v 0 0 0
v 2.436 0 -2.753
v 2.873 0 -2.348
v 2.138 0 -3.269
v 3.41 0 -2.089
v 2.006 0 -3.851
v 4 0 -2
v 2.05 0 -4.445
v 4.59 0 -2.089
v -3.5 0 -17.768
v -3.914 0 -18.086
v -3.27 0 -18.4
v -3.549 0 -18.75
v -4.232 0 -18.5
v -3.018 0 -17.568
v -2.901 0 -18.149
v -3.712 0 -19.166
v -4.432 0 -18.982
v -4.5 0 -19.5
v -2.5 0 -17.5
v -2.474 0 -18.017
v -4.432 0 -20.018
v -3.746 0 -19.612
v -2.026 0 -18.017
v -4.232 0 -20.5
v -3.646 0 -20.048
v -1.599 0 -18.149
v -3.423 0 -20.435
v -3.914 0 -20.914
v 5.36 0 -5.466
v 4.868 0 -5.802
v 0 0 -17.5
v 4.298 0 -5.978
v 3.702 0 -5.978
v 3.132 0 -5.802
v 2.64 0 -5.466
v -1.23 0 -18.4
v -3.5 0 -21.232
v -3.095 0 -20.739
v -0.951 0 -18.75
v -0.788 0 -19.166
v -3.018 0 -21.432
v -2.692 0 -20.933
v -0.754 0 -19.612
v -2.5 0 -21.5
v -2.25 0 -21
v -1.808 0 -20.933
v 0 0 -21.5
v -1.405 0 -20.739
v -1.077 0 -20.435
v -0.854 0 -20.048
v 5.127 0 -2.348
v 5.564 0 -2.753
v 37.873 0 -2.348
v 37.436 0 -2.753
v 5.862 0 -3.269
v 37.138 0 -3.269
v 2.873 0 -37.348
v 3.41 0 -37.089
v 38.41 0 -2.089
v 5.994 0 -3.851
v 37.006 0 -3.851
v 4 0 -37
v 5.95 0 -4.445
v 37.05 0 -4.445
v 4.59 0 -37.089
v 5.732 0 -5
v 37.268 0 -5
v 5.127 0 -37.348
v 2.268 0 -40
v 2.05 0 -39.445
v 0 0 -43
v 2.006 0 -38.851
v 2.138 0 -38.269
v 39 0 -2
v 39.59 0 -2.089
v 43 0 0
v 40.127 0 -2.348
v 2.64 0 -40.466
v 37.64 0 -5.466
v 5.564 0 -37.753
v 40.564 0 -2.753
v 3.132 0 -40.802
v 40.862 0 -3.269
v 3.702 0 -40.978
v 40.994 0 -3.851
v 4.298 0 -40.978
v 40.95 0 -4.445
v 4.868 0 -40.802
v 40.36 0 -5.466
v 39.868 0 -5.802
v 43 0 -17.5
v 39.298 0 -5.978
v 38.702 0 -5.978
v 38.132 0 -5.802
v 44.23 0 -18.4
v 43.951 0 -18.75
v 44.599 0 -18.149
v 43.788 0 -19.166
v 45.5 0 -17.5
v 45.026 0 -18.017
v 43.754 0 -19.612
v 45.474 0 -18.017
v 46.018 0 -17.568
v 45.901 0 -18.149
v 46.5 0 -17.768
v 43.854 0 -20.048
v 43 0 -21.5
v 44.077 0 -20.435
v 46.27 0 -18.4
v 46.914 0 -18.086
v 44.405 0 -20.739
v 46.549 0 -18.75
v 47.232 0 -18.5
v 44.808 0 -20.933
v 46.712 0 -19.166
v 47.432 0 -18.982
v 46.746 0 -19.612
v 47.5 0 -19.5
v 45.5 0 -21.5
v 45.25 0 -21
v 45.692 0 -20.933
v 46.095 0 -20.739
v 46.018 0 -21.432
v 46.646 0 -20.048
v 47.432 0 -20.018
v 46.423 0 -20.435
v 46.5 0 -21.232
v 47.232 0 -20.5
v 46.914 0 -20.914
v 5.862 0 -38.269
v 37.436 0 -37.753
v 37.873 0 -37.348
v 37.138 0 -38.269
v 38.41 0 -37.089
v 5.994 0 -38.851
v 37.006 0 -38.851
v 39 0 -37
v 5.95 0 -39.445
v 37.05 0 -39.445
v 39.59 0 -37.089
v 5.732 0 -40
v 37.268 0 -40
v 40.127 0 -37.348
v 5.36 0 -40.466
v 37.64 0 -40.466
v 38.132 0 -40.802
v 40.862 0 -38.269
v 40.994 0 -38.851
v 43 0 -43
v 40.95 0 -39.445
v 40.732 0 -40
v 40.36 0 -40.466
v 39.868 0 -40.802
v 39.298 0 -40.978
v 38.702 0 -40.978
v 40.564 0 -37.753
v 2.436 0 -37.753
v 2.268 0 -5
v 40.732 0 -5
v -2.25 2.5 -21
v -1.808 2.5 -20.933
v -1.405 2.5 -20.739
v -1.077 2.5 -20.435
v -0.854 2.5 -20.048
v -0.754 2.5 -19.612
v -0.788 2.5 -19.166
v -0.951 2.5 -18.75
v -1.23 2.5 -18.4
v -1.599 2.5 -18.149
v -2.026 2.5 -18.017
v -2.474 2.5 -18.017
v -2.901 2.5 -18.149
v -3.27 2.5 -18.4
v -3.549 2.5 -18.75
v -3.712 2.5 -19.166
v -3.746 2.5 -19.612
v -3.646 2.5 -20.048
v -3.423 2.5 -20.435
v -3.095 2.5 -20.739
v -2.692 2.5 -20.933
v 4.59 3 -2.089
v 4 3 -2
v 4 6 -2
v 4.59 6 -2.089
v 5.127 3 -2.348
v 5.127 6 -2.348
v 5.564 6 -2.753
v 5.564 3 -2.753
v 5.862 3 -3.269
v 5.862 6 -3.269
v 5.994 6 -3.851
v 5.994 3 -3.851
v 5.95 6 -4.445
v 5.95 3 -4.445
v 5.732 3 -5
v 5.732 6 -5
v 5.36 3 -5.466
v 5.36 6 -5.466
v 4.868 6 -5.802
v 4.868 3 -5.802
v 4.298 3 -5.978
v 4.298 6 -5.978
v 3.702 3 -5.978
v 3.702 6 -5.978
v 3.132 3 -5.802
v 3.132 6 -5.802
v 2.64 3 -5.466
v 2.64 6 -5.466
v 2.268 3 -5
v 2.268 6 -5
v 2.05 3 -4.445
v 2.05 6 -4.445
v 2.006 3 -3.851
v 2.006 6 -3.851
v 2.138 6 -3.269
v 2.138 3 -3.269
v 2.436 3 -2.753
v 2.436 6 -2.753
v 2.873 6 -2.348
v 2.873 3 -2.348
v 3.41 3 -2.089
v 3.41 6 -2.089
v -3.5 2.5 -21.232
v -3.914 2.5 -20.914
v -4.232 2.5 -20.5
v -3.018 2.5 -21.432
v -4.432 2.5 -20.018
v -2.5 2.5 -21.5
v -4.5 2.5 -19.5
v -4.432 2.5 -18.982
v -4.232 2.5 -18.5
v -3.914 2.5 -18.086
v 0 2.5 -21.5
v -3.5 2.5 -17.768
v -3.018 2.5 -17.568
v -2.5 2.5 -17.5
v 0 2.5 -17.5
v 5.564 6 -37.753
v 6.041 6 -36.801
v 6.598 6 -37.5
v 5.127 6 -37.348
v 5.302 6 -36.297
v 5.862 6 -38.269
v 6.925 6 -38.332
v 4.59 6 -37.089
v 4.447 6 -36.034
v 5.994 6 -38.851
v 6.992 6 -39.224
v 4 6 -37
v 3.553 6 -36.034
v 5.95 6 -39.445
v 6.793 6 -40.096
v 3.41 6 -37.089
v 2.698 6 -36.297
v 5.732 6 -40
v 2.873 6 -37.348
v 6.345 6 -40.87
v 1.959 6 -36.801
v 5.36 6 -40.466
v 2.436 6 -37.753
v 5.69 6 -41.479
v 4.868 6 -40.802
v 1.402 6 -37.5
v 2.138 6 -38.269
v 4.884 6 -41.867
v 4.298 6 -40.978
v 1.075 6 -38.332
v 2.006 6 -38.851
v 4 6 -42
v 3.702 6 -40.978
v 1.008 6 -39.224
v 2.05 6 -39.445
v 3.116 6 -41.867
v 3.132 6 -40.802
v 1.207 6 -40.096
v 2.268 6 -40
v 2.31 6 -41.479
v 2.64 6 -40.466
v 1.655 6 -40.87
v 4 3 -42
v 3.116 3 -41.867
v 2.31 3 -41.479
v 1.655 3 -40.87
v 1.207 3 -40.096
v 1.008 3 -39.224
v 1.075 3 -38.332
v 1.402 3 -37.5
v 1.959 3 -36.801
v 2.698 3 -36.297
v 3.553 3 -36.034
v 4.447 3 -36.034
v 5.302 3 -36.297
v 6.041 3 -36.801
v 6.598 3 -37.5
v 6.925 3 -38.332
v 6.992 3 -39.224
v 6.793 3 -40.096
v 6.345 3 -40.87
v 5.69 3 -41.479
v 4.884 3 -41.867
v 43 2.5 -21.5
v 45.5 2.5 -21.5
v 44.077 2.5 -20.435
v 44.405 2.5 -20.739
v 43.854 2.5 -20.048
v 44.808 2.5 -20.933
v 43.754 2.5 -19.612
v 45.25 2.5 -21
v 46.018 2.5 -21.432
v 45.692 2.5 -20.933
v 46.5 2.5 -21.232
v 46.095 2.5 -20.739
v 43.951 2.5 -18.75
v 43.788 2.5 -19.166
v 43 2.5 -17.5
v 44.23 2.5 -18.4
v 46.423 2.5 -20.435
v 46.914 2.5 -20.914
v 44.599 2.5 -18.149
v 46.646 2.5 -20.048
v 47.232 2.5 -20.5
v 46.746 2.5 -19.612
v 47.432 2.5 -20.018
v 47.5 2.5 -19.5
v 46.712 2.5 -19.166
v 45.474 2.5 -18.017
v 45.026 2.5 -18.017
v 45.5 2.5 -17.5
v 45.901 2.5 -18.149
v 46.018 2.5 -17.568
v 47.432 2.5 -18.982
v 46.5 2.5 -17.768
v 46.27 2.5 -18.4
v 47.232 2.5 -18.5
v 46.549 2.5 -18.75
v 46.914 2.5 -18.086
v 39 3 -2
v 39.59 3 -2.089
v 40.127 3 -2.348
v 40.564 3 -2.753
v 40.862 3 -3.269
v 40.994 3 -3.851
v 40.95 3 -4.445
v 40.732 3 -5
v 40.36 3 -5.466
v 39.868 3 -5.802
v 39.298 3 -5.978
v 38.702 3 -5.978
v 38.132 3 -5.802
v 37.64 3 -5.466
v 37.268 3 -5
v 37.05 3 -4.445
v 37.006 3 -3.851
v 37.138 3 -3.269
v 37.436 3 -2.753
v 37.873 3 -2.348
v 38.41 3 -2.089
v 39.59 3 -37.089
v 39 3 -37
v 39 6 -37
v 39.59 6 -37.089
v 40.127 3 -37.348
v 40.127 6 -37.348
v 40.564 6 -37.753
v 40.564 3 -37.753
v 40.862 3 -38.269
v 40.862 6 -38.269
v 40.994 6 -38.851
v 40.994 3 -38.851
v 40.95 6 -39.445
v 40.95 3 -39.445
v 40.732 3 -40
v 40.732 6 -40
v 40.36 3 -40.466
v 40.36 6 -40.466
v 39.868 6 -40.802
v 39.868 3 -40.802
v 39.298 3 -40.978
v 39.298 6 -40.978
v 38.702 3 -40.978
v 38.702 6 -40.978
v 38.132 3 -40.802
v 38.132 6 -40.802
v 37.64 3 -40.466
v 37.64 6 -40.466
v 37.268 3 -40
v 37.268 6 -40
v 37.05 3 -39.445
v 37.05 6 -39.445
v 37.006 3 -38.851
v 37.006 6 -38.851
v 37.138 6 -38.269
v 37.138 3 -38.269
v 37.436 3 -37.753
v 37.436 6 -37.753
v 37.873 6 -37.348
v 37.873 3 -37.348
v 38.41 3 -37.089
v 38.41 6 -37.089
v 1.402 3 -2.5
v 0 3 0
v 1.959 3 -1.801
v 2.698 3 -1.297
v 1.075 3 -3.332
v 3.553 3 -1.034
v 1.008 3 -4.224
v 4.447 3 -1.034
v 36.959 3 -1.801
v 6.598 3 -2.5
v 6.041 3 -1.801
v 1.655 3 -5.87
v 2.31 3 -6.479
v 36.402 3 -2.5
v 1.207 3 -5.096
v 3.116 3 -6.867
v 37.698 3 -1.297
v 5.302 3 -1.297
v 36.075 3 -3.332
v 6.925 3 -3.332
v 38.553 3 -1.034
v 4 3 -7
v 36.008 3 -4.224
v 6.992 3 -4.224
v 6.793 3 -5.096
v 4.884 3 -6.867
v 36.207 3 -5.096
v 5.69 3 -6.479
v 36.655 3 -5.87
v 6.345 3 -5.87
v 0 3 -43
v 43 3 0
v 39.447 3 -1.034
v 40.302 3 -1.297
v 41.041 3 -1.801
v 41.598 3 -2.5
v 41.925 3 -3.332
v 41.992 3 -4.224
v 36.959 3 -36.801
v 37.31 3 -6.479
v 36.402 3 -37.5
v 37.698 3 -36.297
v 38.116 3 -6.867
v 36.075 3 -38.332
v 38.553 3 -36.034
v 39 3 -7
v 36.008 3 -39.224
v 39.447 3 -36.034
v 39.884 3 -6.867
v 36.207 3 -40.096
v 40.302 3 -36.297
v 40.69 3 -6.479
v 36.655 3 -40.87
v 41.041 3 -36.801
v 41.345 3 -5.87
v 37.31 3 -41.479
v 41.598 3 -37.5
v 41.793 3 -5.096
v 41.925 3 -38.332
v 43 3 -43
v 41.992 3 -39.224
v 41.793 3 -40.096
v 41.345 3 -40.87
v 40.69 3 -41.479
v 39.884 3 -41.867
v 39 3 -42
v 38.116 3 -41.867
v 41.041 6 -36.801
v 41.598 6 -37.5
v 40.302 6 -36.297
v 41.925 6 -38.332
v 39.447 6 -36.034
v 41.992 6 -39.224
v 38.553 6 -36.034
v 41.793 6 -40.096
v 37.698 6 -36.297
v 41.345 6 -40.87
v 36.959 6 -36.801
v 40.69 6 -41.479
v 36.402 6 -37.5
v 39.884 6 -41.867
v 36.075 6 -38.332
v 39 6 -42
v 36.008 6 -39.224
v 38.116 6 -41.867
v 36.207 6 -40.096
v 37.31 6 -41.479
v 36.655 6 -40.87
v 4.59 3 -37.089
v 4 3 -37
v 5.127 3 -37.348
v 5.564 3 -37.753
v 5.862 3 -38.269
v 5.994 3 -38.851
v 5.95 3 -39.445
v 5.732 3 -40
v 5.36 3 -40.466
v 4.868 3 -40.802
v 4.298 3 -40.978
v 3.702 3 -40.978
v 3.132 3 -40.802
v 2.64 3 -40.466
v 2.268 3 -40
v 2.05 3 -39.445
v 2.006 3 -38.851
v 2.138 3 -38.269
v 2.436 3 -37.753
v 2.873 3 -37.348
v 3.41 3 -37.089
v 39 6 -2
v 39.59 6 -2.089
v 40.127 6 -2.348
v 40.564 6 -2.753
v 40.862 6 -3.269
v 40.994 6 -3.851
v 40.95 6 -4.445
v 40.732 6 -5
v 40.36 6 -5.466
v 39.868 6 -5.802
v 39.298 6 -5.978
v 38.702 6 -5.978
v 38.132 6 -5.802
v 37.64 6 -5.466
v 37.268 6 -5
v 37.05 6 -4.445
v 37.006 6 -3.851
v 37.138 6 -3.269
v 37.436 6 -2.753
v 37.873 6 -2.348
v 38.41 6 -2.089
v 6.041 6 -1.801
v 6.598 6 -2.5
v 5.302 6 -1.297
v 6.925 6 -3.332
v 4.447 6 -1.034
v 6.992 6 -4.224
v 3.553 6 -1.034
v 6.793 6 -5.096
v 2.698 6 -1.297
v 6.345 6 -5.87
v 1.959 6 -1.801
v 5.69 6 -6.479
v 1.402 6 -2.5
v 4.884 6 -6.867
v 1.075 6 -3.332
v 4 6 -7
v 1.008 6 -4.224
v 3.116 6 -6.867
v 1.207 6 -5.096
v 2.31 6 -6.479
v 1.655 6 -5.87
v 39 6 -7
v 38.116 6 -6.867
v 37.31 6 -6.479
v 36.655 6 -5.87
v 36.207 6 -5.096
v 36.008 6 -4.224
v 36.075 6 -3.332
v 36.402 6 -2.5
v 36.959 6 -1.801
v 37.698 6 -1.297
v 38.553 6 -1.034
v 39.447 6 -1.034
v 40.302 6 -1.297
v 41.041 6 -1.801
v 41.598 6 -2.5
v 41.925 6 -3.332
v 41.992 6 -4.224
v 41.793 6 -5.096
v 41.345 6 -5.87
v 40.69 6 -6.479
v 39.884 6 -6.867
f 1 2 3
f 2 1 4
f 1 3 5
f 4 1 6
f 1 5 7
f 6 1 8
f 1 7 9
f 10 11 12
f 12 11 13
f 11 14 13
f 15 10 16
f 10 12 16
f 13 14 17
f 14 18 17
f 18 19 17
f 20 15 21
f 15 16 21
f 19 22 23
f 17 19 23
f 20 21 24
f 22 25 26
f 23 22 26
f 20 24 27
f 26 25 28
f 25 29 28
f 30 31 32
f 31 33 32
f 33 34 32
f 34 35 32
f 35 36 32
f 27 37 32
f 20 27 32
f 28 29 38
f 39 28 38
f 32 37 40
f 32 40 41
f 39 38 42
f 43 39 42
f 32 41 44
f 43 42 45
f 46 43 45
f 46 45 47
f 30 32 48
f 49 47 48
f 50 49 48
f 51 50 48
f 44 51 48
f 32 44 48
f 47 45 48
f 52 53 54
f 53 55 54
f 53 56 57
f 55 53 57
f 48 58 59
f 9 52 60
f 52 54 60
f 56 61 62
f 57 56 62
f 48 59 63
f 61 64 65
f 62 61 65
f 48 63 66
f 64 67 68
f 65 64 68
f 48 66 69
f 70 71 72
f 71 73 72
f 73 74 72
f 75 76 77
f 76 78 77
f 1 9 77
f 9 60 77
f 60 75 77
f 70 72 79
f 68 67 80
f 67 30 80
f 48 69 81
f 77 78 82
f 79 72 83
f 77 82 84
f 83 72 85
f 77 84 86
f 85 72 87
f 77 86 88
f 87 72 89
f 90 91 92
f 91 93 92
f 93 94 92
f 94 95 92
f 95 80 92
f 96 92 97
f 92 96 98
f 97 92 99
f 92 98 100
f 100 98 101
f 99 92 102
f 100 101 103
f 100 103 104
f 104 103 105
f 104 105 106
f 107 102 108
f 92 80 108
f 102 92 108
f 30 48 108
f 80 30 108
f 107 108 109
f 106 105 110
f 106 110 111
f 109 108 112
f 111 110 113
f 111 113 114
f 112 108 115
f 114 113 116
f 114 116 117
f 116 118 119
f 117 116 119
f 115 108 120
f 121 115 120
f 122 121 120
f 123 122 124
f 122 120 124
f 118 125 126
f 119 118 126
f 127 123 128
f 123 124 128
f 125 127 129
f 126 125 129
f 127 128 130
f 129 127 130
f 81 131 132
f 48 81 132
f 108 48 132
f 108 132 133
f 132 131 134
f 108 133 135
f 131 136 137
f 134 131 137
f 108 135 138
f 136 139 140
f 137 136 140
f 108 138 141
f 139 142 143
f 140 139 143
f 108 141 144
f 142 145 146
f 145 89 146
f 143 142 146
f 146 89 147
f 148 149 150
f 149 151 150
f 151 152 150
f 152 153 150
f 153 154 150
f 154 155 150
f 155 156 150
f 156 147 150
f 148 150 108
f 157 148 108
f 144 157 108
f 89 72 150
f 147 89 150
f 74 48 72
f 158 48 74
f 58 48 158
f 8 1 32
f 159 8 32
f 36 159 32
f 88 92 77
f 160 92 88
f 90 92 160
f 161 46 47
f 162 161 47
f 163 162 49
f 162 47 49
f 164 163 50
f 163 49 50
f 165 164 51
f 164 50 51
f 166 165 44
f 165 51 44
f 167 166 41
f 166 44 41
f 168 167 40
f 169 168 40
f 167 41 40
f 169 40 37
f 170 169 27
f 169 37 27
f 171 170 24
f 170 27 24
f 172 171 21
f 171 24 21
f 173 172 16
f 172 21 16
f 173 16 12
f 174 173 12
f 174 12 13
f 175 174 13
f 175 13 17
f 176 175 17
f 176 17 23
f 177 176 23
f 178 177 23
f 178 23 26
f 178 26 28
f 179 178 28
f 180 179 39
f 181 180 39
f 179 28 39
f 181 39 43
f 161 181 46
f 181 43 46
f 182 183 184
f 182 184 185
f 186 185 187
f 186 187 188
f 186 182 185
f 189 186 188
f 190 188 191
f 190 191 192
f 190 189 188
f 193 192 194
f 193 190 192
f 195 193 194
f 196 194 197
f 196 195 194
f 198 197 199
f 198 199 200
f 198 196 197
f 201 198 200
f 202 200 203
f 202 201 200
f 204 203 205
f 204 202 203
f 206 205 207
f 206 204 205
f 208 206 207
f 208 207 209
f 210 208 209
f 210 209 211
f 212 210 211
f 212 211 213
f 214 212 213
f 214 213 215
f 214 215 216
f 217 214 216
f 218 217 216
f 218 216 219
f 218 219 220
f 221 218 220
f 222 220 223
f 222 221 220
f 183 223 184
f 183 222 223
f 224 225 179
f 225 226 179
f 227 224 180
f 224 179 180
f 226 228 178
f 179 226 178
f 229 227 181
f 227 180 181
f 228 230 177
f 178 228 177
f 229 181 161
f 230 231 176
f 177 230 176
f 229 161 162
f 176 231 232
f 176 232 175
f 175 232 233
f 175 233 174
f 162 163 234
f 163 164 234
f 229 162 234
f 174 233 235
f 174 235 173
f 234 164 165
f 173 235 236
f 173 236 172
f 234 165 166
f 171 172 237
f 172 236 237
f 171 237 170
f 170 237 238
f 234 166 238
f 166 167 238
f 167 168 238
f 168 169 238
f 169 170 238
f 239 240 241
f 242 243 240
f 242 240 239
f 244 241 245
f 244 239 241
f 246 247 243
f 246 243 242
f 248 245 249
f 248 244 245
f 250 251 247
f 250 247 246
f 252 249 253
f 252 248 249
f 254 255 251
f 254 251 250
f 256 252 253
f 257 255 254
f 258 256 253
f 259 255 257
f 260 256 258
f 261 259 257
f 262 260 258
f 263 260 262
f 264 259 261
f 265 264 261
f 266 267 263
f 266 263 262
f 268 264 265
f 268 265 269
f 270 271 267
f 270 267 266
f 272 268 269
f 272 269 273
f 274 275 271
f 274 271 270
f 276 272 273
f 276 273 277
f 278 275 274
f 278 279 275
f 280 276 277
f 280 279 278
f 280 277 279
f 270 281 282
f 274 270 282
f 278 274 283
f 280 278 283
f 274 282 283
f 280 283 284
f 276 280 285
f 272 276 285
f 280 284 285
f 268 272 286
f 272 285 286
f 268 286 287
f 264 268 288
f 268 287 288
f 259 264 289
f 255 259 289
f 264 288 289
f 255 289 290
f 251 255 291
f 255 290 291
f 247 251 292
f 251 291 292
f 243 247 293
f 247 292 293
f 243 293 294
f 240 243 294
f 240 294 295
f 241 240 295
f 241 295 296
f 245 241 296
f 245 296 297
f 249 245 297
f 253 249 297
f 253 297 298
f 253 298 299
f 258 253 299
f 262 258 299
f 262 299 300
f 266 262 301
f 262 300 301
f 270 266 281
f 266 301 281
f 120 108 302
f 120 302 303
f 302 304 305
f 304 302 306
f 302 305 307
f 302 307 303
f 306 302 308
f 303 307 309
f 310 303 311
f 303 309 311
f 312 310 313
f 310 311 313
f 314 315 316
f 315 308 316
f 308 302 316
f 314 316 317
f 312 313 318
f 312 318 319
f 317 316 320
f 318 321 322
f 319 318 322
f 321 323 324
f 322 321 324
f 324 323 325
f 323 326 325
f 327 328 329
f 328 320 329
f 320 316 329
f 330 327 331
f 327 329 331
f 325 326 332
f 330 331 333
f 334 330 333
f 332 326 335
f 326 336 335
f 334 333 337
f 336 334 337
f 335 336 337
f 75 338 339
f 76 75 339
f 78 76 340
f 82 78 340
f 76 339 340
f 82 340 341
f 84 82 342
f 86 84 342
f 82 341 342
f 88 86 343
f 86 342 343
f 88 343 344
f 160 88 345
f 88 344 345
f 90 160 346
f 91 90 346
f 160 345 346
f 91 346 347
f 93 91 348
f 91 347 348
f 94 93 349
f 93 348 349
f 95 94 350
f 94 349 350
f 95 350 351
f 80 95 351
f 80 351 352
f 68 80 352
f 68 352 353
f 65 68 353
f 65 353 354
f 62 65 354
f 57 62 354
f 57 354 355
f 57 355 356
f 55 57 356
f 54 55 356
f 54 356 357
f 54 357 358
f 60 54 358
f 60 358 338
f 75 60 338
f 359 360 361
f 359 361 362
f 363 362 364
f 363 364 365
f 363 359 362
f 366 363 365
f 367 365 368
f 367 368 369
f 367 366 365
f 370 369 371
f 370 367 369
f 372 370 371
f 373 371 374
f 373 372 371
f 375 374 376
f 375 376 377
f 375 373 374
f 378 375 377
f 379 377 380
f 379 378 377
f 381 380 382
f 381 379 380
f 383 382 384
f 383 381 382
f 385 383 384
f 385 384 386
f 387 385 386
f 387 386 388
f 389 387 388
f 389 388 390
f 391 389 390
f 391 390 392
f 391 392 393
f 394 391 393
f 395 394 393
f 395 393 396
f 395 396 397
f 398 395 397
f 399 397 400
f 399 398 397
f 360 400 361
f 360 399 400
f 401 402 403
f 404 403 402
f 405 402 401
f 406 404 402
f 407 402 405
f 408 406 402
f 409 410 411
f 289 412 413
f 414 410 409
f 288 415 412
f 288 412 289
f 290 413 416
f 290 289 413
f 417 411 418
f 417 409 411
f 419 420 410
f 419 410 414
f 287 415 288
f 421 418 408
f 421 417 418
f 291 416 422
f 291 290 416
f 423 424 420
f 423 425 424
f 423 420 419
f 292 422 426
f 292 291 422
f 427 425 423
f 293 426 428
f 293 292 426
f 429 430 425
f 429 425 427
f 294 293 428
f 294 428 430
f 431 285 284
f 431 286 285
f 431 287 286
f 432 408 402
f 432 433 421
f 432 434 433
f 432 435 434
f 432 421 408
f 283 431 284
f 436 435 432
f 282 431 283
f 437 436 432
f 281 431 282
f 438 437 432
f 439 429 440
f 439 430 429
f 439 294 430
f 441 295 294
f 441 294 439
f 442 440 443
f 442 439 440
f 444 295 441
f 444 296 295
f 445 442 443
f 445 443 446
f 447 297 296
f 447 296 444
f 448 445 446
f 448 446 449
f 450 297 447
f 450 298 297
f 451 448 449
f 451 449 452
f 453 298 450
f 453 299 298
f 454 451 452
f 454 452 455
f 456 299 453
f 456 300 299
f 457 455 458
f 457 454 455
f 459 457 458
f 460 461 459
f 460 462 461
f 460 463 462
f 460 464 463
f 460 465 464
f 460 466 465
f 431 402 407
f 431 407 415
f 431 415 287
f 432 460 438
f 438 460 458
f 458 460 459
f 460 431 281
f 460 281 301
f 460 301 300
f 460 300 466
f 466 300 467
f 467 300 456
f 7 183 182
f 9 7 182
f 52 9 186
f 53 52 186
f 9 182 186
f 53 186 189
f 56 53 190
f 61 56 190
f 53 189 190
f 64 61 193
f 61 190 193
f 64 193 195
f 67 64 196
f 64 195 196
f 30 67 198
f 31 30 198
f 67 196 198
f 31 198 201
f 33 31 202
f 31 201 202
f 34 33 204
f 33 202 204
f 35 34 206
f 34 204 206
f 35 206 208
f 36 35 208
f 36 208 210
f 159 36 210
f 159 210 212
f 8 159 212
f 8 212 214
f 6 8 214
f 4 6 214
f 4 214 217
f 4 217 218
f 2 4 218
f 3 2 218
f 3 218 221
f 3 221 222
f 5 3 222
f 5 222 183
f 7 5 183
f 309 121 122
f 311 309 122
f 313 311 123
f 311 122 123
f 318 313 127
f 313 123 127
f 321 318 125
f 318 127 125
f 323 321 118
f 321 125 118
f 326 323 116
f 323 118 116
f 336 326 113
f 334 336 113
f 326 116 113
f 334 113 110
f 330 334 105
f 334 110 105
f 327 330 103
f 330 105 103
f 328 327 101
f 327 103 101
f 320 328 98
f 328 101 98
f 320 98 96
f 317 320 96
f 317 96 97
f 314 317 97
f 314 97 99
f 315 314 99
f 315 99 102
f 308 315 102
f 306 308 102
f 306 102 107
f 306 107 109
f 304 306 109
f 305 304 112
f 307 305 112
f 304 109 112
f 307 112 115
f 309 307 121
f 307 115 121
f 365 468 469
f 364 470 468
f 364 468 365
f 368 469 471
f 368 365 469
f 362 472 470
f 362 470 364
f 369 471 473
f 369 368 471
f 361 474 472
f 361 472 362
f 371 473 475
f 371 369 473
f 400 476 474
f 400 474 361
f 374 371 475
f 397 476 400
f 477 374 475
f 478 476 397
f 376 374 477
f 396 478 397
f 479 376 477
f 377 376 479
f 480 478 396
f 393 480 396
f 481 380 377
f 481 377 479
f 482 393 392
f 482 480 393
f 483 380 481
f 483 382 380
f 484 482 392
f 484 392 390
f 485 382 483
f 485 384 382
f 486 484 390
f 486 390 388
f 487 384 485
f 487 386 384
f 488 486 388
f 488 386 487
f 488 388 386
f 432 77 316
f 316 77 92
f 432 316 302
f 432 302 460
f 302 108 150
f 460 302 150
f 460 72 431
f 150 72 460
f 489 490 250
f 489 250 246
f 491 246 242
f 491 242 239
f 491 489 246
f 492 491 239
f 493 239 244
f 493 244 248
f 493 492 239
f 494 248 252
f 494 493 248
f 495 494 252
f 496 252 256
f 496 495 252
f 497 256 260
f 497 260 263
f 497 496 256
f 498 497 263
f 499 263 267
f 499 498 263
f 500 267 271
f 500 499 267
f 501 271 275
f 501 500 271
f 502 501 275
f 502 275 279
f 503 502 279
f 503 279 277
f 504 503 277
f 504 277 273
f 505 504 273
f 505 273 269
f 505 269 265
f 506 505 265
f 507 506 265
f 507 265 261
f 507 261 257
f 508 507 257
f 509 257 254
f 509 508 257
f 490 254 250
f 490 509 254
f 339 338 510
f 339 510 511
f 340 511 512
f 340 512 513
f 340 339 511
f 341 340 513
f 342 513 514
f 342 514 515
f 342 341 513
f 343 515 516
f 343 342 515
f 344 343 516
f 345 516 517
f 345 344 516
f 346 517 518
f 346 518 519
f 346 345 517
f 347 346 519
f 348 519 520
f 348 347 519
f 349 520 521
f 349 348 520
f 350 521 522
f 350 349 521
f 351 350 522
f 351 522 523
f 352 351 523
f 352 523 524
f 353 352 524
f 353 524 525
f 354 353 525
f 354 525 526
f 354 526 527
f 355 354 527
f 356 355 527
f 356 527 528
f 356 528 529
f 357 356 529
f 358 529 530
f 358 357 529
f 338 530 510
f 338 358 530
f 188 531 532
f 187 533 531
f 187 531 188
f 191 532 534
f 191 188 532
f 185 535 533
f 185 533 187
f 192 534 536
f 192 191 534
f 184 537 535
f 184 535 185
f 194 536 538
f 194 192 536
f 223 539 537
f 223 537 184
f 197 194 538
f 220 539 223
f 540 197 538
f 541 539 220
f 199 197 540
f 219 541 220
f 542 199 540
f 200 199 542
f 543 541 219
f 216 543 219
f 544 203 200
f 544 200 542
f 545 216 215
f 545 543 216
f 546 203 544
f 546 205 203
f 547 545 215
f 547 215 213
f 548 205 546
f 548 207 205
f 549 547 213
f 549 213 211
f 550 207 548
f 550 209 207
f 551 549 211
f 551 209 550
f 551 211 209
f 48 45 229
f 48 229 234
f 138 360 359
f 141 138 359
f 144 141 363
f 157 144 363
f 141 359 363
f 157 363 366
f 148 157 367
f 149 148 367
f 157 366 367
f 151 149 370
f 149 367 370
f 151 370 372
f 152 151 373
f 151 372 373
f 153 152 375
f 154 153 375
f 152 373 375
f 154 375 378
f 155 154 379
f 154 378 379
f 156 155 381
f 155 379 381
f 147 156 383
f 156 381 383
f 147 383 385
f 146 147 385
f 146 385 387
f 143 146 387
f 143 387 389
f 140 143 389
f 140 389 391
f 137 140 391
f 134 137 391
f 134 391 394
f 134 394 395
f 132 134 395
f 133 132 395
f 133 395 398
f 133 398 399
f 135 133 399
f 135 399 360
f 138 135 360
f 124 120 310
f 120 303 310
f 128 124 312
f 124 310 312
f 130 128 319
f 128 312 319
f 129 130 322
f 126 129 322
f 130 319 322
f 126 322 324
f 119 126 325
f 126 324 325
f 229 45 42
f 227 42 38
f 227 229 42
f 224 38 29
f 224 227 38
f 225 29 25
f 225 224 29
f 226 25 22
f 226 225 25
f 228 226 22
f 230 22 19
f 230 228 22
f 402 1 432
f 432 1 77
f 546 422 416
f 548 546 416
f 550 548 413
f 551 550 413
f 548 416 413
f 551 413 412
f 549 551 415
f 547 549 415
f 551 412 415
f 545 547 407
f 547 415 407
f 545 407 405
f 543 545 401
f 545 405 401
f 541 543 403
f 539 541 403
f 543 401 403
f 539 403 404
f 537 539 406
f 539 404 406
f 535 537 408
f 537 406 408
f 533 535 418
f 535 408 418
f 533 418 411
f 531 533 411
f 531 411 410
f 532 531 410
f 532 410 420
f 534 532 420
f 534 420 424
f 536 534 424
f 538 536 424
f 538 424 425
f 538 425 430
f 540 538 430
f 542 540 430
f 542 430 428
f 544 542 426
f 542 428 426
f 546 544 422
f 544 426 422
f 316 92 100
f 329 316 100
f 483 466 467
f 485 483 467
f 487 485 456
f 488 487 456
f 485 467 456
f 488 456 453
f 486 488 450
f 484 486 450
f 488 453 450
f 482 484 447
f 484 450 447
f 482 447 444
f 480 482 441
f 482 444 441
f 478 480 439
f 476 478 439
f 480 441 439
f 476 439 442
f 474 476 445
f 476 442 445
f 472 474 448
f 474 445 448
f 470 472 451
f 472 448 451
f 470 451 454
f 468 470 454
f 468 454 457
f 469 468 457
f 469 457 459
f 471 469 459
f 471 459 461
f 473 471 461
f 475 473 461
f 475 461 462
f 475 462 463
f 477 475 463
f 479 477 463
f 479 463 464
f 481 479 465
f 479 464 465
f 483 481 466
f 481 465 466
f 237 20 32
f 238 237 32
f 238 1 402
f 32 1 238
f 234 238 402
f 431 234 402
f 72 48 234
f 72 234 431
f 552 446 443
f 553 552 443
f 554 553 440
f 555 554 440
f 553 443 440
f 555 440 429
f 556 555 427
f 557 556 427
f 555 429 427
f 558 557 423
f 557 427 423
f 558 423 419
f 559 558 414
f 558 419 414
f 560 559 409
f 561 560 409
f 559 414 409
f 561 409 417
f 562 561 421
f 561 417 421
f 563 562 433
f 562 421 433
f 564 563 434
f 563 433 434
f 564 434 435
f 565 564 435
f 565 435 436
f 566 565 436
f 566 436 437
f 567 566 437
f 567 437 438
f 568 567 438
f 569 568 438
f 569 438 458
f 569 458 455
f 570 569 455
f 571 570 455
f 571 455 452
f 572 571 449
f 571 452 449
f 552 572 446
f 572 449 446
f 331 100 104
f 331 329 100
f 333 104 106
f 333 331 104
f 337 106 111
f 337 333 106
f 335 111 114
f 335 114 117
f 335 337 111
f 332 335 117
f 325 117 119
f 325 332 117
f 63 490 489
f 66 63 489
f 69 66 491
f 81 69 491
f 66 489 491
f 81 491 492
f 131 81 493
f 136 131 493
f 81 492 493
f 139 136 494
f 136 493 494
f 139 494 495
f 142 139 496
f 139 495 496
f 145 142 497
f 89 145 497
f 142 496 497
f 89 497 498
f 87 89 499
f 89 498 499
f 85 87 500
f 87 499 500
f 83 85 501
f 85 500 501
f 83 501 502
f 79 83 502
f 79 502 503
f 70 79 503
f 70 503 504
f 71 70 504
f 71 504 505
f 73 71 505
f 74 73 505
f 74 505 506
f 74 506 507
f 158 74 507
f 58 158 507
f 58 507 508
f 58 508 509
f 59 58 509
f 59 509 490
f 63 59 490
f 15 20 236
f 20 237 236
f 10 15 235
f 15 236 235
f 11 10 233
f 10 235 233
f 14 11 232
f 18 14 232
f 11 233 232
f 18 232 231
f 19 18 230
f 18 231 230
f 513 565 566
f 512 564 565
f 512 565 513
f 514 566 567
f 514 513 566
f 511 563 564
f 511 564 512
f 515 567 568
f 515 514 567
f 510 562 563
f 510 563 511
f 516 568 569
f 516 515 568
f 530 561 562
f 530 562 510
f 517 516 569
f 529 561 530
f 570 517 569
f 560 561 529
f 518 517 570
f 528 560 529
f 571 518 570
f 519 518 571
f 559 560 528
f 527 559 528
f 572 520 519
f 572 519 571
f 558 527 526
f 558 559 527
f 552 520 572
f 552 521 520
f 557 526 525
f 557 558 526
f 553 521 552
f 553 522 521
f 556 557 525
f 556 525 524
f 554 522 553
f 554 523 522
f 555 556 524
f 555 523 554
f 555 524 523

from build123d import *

# Parameters (mm, degrees)
SKETCH1_W            = 43
SKETCH1_H            = 43
BOSS_EXTRUDE1_DEPTH  = 3
SKETCH2_R            = 3
SKETCH2_R_2          = 2
BOSS_EXTRUDE5_DEPTH  = 3
SKETCH2_9_R          = 3
SKETCH2_9_R_2        = 2
BOSS_EXTRUDE6_DEPTH  = 3
SKETCH2_10_R         = 3
SKETCH2_10_R_2       = 2
BOSS_EXTRUDE7_DEPTH  = 3
SKETCH2_11_R         = 3
SKETCH2_11_R_2       = 2
BOSS_EXTRUDE8_DEPTH  = 3
SKETCH3_W            = 4.5
SKETCH3_H            = 4
SKETCH3_R            = 1.5
BOSS_EXTRUDE9_DEPTH  = 2.5
FILLET2_R            = 2
SKETCH4_W            = 4.5
SKETCH4_H            = 4
SKETCH4_R            = 1.5
BOSS_EXTRUDE10_DEPTH = 2.5
FILLET3_R            = 2
SKETCH7_R            = 2
CUT_EXTRUDE1_DEPTH   = 65.142419661
SKETCH2_13_R         = 2
CUT_EXTRUDE2_DEPTH   = 65.142419661
SKETCH2_14_R         = 2
CUT_EXTRUDE3_DEPTH   = 65.142419661


with BuildPart() as part:
    # Sketch1 → Boss-Extrude1 (new body)
    with BuildSketch(Plane(origin=(0, 0, 0), x_dir=(1, 0, 0), z_dir=(0, 1, 0))):
        with Locations((21.5, 21.5)):
            Rectangle(SKETCH1_W, SKETCH1_H)
    extrude(amount=BOSS_EXTRUDE1_DEPTH)

    # Sketch2 → Boss-Extrude5 (add)
    with BuildSketch(Plane(origin=(0, 3, 0), x_dir=(1, 0, 0), z_dir=(0, 1, 0))):
        with Locations(Location((4, 39, 0), (0, 0, 90))):
            Circle(SKETCH2_R)
        with Locations(Location((4, 39, 0), (0, 0, 270))):
            Circle(SKETCH2_R_2, mode=Mode.SUBTRACT)
    extrude(amount=BOSS_EXTRUDE5_DEPTH)

    # Sketch2<9> → Boss-Extrude6 (add)
    with BuildSketch(Plane(origin=(0, 3, 0), x_dir=(1, 0, 0), z_dir=(0, 1, 0))):
        with Locations(Location((39, 39, 0), (0, 0, 90))):
            Circle(SKETCH2_9_R)
        with Locations(Location((39, 39, 0), (0, 0, 270))):
            Circle(SKETCH2_9_R_2, mode=Mode.SUBTRACT)
    extrude(amount=BOSS_EXTRUDE6_DEPTH)

    # Sketch2<10> → Boss-Extrude7 (add)
    with BuildSketch(Plane(origin=(0, 3, 0), x_dir=(1, 0, 0), z_dir=(0, 1, 0))):
        with Locations(Location((4, 4, 0), (0, 0, 90))):
            Circle(SKETCH2_10_R)
        with Locations(Location((4, 4, 0), (0, 0, 270))):
            Circle(SKETCH2_10_R_2, mode=Mode.SUBTRACT)
    extrude(amount=BOSS_EXTRUDE7_DEPTH)

    # Sketch2<11> → Boss-Extrude8 (add)
    with BuildSketch(Plane(origin=(0, 3, 0), x_dir=(1, 0, 0), z_dir=(0, 1, 0))):
        with Locations(Location((39, 4, 0), (0, 0, 90))):
            Circle(SKETCH2_11_R)
        with Locations(Location((39, 4, 0), (0, 0, 270))):
            Circle(SKETCH2_11_R_2, mode=Mode.SUBTRACT)
    extrude(amount=BOSS_EXTRUDE8_DEPTH)

    # Sketch3 → Boss-Extrude9 (add)
    with BuildSketch(Plane.XZ):
        with Locations((-2.25, -19.5)):
            Rectangle(SKETCH3_W, SKETCH3_H)
        with Locations(Location((-2.25, -19.5, 0), (0, 0, 270))):
            Circle(SKETCH3_R, mode=Mode.SUBTRACT)
    extrude(amount=-BOSS_EXTRUDE9_DEPTH)

    # Fillet2
    fillet2_edges = [part.edges().sort_by_distance(p)[0] for p in [
        (-4.5, 1.25, -21.5),
        (-4.5, 1.25, -17.5),
    ]]
    fillet(fillet2_edges, radius=FILLET2_R - 0.0001)  # a hair under: the kernel refuses the full size

    # Sketch4 → Boss-Extrude10 (add)
    with BuildSketch(Plane.XZ):
        with Locations((45.25, -19.5)):
            Rectangle(SKETCH4_W, SKETCH4_H)
        with Locations(Location((45.25, -19.5, 0), (0, 0, 270))):
            Circle(SKETCH4_R, mode=Mode.SUBTRACT)
    extrude(amount=-BOSS_EXTRUDE10_DEPTH)

    # Fillet3
    fillet3_edges = [part.edges().sort_by_distance(p)[0] for p in [
        (47.5, 1.25, -21.5),
        (47.5, 1.25, -17.5),
    ]]
    fillet(fillet3_edges, radius=FILLET3_R - 0.0001)  # a hair under: the kernel refuses the full size

    # Sketch7 → Cut-Extrude1 (cut, through all)
    with BuildSketch(Plane(origin=(0, 3, 0), x_dir=(1, 0, 0), z_dir=(0, 1, 0))):
        with Locations(Location((4, 39, 0), (0, 0, 270))):
            Circle(SKETCH7_R)
    extrude(amount=-CUT_EXTRUDE1_DEPTH, mode=Mode.SUBTRACT)

    # Sketch2<13> → Cut-Extrude2 (cut, through all)
    with BuildSketch(Plane(origin=(0, 3, 0), x_dir=(1, 0, 0), z_dir=(0, 1, 0))):
        with Locations(Location((39, 39, 0), (0, 0, 270))):
            Circle(SKETCH2_13_R)
    extrude(amount=-CUT_EXTRUDE2_DEPTH, mode=Mode.SUBTRACT)

    # Sketch2<14> → Cut-Extrude3 (cut, through all)
    with BuildSketch(Plane(origin=(0, 3, 0), x_dir=(1, 0, 0), z_dir=(0, 1, 0))):
        with Locations(Location((4, 4, 0), (0, 0, 270))):
            Circle(SKETCH2_14_R)
        with Locations(Location((39, 4, 0), (0, 0, 270))):
            Circle(SKETCH2_14_R)
    extrude(amount=-CUT_EXTRUDE3_DEPTH, mode=Mode.SUBTRACT)


solid = part.part
